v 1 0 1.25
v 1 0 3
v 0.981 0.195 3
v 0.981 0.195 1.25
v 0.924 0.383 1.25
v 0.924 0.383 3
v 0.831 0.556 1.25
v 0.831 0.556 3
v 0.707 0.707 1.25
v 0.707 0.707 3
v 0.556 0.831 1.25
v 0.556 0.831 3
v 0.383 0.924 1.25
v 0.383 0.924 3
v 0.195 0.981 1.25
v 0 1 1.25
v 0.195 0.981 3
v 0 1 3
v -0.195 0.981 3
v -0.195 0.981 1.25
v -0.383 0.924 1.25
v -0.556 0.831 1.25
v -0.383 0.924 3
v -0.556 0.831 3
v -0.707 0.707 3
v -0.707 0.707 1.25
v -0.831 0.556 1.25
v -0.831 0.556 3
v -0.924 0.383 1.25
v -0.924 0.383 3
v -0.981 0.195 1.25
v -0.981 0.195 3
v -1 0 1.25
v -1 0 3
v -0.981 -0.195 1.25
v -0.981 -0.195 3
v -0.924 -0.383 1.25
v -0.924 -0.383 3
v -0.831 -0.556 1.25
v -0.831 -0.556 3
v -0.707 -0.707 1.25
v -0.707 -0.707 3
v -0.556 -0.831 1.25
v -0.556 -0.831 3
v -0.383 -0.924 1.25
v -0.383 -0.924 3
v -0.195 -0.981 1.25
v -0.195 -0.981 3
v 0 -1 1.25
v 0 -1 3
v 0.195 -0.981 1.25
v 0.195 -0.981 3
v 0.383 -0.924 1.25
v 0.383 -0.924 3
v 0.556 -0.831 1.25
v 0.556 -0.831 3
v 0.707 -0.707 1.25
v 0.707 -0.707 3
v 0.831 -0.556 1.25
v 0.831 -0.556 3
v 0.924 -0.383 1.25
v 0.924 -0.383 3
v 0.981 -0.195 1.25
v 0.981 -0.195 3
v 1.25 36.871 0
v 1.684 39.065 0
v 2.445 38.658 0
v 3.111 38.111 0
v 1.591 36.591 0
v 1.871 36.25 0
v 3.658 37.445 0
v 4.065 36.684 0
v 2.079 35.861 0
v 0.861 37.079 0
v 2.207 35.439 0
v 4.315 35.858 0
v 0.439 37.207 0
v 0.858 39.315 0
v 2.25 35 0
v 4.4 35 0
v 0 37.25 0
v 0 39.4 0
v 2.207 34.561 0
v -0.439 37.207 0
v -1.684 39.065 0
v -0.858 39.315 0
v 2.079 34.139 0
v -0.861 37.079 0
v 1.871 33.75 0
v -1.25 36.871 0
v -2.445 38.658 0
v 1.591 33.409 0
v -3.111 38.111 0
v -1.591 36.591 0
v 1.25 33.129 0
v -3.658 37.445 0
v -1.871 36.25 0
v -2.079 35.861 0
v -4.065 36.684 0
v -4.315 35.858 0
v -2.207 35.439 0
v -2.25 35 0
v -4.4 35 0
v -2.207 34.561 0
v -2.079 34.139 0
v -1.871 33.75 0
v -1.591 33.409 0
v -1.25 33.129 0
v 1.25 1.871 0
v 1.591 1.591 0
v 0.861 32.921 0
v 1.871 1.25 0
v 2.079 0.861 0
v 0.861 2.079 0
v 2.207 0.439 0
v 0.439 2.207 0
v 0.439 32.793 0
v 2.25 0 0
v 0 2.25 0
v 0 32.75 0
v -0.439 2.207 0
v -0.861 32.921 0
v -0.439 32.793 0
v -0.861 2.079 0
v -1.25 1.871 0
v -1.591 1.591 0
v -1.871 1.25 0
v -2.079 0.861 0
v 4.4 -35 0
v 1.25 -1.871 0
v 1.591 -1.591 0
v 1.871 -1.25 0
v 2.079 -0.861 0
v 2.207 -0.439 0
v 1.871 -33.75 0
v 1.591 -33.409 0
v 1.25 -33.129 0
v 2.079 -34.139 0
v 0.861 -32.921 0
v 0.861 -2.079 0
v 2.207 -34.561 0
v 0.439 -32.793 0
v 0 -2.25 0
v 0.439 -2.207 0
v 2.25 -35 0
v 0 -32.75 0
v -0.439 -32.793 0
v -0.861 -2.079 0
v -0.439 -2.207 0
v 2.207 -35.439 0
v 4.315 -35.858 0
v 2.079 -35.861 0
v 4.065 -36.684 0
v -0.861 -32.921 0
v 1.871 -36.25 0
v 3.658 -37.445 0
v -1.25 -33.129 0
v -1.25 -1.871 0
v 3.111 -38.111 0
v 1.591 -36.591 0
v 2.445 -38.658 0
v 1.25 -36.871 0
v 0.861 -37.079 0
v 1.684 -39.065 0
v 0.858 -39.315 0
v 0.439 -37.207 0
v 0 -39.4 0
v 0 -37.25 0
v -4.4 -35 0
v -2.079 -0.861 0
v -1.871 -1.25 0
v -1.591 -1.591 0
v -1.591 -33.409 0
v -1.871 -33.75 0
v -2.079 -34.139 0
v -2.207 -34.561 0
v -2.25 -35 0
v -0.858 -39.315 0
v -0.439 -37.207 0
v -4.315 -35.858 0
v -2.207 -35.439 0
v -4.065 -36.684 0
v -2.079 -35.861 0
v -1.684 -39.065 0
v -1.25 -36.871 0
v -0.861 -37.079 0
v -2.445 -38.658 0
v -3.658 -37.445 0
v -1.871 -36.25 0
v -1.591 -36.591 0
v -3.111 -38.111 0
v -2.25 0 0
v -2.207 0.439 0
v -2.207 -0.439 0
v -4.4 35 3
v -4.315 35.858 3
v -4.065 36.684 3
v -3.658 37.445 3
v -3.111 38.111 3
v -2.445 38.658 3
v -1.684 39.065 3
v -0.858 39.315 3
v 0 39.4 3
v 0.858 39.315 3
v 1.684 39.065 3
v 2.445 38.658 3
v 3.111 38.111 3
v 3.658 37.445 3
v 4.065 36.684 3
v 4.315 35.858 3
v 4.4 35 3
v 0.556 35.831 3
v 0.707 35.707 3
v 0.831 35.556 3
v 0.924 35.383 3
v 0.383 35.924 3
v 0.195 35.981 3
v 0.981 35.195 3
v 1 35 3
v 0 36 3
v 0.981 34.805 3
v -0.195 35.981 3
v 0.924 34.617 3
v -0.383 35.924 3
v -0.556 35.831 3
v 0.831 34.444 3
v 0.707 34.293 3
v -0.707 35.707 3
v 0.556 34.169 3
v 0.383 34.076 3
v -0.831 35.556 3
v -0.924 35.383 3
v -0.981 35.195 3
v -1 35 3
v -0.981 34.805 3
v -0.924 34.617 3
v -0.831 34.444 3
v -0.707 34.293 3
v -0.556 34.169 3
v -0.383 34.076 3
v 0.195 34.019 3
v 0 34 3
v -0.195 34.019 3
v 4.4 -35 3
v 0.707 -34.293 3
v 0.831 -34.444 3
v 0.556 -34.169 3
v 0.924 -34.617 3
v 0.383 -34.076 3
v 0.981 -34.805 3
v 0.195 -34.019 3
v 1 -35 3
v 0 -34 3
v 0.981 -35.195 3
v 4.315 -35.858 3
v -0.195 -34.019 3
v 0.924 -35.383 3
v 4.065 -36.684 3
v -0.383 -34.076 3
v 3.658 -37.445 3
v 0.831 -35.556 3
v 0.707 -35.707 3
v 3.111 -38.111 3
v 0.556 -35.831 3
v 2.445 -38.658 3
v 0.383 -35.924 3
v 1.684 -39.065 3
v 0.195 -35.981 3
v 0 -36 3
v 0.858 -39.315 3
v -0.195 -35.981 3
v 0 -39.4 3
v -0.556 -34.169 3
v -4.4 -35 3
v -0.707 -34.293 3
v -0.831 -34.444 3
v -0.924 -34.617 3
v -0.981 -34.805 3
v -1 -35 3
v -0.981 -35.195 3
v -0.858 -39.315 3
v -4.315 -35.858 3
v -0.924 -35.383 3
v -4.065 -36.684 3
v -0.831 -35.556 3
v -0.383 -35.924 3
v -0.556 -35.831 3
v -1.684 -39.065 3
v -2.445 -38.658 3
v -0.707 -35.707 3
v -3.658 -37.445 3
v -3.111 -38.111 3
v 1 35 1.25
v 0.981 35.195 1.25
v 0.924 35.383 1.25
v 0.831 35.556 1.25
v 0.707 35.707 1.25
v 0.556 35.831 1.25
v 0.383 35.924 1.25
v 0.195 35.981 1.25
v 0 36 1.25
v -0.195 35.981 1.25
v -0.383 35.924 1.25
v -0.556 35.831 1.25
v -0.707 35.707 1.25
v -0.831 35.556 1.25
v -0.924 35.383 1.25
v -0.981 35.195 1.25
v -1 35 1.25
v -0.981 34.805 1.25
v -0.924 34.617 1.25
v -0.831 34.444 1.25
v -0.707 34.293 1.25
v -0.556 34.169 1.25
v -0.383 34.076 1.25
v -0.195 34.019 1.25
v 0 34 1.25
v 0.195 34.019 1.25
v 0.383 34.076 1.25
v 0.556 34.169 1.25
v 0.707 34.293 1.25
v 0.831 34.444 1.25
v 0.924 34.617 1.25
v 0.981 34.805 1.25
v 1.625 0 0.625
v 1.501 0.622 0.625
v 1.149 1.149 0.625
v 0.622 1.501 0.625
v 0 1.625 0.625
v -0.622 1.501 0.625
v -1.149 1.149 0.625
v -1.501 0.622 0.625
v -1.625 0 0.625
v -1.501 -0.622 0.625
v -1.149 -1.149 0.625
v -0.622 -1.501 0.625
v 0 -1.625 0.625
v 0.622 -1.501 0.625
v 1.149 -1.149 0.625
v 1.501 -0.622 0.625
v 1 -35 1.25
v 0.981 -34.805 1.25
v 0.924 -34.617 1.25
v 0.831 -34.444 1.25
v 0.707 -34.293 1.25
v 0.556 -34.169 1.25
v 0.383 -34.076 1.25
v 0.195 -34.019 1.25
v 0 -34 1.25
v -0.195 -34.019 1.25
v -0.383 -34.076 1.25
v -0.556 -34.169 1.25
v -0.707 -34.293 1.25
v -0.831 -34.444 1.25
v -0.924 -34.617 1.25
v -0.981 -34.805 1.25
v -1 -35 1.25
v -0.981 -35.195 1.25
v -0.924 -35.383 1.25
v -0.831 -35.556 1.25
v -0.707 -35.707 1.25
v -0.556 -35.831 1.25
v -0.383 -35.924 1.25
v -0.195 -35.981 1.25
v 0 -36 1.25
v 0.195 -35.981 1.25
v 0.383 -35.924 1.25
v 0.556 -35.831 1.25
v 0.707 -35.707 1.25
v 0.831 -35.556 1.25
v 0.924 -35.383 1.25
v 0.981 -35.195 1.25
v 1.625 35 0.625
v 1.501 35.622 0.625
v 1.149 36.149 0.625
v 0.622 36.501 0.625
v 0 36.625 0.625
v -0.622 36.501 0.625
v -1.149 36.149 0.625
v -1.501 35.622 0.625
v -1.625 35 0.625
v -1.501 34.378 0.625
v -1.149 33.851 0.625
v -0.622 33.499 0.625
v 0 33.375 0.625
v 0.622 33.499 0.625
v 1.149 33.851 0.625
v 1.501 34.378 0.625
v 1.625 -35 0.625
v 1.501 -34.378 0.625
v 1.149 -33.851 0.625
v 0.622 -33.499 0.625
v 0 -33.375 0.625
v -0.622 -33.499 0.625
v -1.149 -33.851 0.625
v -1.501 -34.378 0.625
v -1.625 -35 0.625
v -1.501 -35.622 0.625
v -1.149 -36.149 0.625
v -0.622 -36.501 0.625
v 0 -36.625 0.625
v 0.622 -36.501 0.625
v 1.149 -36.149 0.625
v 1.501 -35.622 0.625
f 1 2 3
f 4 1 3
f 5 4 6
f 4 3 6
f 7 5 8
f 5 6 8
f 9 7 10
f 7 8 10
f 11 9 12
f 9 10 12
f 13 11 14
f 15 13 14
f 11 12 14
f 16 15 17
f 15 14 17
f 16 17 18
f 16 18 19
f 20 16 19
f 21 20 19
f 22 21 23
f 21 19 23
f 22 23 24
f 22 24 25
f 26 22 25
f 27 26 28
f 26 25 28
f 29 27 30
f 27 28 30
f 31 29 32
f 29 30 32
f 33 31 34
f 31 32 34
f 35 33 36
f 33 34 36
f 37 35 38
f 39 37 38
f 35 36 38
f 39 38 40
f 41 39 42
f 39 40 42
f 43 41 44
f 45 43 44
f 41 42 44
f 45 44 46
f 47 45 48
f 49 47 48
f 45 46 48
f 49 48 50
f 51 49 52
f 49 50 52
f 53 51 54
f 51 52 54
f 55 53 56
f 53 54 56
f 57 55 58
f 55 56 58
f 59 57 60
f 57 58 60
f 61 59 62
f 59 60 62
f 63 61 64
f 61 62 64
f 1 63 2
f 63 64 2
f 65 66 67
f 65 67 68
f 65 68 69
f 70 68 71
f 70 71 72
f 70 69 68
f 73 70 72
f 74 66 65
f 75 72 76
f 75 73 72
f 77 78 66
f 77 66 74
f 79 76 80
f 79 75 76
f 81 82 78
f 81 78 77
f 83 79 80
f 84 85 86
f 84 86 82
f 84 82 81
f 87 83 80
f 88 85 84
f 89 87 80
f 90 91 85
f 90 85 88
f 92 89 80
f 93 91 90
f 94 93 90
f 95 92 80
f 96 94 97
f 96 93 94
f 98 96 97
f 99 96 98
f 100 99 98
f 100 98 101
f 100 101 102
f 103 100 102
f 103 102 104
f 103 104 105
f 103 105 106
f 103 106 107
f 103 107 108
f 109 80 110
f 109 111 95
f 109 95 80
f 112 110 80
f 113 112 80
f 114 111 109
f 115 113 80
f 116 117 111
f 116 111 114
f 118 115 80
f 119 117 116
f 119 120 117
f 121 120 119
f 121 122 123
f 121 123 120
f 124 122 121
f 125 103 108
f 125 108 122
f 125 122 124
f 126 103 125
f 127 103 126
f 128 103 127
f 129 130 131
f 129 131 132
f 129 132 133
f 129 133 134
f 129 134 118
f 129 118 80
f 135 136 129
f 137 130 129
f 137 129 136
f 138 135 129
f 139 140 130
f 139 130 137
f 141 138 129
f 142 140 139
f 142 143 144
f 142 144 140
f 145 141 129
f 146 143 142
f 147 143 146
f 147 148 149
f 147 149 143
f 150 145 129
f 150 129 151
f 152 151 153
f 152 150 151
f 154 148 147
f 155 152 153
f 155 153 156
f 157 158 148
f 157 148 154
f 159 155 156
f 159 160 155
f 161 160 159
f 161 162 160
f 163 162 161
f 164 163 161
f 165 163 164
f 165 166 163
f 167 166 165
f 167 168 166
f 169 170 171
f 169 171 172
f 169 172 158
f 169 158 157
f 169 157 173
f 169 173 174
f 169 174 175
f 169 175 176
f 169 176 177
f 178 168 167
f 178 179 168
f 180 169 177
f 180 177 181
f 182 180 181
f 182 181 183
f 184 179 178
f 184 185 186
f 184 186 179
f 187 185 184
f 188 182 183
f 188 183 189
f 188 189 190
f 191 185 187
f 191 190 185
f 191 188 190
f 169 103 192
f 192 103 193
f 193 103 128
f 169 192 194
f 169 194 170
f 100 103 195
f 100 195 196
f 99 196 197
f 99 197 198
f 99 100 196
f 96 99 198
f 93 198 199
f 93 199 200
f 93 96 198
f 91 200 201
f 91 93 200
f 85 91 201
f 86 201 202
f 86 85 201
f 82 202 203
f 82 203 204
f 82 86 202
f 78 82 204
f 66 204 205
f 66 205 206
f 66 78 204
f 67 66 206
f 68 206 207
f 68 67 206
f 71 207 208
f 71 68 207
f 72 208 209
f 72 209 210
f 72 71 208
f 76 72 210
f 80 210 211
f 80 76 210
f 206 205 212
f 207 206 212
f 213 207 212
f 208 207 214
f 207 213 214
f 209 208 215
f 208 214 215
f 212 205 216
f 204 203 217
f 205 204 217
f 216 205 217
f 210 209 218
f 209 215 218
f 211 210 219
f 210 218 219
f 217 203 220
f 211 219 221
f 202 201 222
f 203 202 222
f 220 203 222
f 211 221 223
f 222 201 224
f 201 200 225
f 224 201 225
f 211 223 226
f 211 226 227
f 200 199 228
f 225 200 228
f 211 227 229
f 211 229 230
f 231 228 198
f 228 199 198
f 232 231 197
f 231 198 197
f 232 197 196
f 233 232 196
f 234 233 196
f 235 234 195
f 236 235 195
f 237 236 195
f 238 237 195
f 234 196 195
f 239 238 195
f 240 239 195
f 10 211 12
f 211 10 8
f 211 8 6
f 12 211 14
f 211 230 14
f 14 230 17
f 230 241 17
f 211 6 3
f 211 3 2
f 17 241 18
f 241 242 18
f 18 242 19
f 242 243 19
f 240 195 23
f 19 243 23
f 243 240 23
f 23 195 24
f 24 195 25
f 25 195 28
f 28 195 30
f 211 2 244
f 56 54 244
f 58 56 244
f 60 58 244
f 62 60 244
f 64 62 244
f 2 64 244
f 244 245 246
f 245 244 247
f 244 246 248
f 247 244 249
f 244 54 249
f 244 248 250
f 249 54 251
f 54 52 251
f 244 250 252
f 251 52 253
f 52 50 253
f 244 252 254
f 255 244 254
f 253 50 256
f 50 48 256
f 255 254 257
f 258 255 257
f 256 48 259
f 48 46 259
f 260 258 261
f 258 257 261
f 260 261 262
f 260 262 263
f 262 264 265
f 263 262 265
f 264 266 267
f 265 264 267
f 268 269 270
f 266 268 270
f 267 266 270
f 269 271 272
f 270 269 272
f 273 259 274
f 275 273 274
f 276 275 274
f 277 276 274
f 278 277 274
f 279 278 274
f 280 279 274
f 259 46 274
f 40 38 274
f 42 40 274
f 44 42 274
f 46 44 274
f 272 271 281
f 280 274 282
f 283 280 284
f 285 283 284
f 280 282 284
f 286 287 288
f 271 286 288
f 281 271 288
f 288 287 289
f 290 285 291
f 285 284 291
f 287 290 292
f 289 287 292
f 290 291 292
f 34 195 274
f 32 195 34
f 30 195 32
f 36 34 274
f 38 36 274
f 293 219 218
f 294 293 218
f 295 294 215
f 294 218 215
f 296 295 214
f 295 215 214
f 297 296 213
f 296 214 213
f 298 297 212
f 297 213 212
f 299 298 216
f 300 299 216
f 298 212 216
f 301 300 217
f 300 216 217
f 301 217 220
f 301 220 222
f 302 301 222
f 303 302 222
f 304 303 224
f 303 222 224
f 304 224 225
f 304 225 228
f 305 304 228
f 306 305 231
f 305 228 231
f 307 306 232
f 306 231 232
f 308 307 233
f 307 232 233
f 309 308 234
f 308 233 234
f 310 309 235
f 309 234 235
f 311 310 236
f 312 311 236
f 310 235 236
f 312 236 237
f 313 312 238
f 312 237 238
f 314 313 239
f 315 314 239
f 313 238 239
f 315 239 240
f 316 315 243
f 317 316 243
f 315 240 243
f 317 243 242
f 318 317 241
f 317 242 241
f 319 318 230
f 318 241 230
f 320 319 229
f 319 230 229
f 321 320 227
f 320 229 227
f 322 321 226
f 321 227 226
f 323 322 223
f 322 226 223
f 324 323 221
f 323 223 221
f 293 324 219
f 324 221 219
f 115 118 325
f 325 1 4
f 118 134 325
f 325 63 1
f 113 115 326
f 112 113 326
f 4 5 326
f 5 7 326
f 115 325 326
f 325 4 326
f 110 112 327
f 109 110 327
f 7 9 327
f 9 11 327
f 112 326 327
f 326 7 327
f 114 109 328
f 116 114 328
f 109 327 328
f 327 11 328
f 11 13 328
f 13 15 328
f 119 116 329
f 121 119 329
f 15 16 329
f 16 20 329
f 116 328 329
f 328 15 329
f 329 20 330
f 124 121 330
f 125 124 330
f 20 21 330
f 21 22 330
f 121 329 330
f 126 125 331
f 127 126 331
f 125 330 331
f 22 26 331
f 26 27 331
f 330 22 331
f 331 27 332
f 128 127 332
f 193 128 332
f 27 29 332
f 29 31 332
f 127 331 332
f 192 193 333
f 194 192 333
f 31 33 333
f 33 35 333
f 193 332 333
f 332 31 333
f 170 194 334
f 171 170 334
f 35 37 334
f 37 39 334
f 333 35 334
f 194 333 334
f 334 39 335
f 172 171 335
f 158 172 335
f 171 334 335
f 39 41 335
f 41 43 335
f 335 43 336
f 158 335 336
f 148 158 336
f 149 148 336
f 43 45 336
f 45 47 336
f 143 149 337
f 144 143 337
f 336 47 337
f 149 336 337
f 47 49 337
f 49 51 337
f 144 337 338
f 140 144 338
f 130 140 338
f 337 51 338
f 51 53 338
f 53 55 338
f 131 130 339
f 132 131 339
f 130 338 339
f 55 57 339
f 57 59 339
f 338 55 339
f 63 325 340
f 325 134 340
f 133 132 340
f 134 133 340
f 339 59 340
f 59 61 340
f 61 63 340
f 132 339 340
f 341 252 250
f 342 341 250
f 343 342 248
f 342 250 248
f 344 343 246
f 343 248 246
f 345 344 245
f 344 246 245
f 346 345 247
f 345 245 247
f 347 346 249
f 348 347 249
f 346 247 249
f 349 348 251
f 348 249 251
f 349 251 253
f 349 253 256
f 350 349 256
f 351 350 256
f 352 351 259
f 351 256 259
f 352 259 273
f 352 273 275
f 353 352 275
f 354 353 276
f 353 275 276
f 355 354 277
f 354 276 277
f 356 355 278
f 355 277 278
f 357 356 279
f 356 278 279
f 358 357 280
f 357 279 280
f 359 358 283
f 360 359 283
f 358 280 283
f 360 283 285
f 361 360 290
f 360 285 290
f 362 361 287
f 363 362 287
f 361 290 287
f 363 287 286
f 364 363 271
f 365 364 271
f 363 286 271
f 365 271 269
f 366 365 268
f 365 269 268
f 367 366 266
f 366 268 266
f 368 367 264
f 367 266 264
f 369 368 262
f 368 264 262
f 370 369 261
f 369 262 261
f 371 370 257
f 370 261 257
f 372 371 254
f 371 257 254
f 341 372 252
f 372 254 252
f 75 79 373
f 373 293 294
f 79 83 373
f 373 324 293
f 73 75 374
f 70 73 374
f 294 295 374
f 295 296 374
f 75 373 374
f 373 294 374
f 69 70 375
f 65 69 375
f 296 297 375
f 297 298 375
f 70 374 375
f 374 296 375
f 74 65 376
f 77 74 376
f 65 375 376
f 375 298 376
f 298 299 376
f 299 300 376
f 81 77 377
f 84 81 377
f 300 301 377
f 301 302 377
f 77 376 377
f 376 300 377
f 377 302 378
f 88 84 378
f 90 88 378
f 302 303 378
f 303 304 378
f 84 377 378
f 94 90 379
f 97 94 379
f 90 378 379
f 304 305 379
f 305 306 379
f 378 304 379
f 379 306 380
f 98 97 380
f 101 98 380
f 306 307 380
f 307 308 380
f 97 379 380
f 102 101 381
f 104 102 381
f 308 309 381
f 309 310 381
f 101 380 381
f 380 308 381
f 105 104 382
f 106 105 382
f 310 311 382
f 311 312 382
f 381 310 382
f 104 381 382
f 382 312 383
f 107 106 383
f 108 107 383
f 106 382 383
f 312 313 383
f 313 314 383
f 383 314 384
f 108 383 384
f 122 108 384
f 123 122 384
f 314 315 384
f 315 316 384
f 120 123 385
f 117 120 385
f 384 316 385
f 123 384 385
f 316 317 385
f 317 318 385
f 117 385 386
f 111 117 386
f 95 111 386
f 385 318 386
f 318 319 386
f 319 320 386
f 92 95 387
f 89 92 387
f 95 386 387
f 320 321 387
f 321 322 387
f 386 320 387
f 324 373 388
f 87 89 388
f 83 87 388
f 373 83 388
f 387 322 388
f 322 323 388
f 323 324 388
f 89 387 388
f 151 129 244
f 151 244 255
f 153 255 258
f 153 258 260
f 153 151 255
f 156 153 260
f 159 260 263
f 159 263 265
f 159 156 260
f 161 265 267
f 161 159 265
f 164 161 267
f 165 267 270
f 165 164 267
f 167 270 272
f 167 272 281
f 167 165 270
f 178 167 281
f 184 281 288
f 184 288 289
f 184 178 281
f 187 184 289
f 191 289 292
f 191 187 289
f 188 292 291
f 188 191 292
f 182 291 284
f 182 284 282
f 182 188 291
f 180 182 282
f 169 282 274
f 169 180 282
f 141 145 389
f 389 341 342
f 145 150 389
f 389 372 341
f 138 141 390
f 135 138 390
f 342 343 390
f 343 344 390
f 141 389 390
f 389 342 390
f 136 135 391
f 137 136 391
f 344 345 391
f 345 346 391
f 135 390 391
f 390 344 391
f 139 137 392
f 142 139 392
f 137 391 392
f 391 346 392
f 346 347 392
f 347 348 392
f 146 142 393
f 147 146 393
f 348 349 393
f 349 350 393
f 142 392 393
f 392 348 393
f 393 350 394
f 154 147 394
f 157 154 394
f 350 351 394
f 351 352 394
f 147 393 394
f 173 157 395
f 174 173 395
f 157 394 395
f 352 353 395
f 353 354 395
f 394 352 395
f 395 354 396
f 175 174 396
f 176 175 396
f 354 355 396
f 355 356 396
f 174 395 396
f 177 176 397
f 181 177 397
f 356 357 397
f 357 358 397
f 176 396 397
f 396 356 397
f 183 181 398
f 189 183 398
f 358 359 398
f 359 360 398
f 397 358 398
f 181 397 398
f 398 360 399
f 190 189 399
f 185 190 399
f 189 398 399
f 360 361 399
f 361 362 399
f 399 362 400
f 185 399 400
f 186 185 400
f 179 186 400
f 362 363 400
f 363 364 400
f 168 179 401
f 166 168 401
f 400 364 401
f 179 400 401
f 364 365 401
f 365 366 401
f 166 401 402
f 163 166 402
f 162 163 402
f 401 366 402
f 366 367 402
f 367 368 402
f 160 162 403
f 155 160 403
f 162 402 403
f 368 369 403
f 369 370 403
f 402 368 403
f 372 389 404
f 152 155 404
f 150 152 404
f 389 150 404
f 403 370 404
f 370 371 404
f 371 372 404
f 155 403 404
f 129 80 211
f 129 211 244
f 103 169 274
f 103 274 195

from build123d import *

# Parameters (mm, degrees)
BOSS_EXTRUDE1_DEPTH = 3
SKETCH6_R           = 1
CUT_EXTRUDE1_DEPTH  = 3
CHAMFER1_SIZE       = 1.25


with BuildPart() as part:
    # Sketch1 → Boss-Extrude1 (new body)
    with BuildSketch(Plane(origin=(0, 0, 0), x_dir=(0, 1, 0), z_dir=(0, 0, 1))):
        with BuildLine():
            Line((-35, 4.4), (35, 4.4))
            ThreePointArc((35, 4.4), (39.4, 0), (35, -4.4))
            Line((35, -4.4), (-35, -4.4))
            ThreePointArc((-35, -4.4), (-39.4, 0), (-35, 4.4))
        make_face()
    extrude(amount=BOSS_EXTRUDE1_DEPTH)

    # Sketch6 → Cut-Extrude1 (cut)
    with BuildSketch(Plane.XY.offset(3)):
        with Locations((0, 35)):
            Circle(SKETCH6_R)
        with Locations((0, -35)):
            Circle(SKETCH6_R)
        Circle(SKETCH6_R)
    extrude(amount=-CUT_EXTRUDE1_DEPTH, mode=Mode.SUBTRACT)

    # Chamfer1
    chamfer1_edges = [part.edges().sort_by_distance(p)[0] for p in [
        (-1, 35, 0),
        (-1, -35, 0),
        (-1, 0, 0),
    ]]
    chamfer(chamfer1_edges, length=CHAMFER1_SIZE)


solid = part.part
